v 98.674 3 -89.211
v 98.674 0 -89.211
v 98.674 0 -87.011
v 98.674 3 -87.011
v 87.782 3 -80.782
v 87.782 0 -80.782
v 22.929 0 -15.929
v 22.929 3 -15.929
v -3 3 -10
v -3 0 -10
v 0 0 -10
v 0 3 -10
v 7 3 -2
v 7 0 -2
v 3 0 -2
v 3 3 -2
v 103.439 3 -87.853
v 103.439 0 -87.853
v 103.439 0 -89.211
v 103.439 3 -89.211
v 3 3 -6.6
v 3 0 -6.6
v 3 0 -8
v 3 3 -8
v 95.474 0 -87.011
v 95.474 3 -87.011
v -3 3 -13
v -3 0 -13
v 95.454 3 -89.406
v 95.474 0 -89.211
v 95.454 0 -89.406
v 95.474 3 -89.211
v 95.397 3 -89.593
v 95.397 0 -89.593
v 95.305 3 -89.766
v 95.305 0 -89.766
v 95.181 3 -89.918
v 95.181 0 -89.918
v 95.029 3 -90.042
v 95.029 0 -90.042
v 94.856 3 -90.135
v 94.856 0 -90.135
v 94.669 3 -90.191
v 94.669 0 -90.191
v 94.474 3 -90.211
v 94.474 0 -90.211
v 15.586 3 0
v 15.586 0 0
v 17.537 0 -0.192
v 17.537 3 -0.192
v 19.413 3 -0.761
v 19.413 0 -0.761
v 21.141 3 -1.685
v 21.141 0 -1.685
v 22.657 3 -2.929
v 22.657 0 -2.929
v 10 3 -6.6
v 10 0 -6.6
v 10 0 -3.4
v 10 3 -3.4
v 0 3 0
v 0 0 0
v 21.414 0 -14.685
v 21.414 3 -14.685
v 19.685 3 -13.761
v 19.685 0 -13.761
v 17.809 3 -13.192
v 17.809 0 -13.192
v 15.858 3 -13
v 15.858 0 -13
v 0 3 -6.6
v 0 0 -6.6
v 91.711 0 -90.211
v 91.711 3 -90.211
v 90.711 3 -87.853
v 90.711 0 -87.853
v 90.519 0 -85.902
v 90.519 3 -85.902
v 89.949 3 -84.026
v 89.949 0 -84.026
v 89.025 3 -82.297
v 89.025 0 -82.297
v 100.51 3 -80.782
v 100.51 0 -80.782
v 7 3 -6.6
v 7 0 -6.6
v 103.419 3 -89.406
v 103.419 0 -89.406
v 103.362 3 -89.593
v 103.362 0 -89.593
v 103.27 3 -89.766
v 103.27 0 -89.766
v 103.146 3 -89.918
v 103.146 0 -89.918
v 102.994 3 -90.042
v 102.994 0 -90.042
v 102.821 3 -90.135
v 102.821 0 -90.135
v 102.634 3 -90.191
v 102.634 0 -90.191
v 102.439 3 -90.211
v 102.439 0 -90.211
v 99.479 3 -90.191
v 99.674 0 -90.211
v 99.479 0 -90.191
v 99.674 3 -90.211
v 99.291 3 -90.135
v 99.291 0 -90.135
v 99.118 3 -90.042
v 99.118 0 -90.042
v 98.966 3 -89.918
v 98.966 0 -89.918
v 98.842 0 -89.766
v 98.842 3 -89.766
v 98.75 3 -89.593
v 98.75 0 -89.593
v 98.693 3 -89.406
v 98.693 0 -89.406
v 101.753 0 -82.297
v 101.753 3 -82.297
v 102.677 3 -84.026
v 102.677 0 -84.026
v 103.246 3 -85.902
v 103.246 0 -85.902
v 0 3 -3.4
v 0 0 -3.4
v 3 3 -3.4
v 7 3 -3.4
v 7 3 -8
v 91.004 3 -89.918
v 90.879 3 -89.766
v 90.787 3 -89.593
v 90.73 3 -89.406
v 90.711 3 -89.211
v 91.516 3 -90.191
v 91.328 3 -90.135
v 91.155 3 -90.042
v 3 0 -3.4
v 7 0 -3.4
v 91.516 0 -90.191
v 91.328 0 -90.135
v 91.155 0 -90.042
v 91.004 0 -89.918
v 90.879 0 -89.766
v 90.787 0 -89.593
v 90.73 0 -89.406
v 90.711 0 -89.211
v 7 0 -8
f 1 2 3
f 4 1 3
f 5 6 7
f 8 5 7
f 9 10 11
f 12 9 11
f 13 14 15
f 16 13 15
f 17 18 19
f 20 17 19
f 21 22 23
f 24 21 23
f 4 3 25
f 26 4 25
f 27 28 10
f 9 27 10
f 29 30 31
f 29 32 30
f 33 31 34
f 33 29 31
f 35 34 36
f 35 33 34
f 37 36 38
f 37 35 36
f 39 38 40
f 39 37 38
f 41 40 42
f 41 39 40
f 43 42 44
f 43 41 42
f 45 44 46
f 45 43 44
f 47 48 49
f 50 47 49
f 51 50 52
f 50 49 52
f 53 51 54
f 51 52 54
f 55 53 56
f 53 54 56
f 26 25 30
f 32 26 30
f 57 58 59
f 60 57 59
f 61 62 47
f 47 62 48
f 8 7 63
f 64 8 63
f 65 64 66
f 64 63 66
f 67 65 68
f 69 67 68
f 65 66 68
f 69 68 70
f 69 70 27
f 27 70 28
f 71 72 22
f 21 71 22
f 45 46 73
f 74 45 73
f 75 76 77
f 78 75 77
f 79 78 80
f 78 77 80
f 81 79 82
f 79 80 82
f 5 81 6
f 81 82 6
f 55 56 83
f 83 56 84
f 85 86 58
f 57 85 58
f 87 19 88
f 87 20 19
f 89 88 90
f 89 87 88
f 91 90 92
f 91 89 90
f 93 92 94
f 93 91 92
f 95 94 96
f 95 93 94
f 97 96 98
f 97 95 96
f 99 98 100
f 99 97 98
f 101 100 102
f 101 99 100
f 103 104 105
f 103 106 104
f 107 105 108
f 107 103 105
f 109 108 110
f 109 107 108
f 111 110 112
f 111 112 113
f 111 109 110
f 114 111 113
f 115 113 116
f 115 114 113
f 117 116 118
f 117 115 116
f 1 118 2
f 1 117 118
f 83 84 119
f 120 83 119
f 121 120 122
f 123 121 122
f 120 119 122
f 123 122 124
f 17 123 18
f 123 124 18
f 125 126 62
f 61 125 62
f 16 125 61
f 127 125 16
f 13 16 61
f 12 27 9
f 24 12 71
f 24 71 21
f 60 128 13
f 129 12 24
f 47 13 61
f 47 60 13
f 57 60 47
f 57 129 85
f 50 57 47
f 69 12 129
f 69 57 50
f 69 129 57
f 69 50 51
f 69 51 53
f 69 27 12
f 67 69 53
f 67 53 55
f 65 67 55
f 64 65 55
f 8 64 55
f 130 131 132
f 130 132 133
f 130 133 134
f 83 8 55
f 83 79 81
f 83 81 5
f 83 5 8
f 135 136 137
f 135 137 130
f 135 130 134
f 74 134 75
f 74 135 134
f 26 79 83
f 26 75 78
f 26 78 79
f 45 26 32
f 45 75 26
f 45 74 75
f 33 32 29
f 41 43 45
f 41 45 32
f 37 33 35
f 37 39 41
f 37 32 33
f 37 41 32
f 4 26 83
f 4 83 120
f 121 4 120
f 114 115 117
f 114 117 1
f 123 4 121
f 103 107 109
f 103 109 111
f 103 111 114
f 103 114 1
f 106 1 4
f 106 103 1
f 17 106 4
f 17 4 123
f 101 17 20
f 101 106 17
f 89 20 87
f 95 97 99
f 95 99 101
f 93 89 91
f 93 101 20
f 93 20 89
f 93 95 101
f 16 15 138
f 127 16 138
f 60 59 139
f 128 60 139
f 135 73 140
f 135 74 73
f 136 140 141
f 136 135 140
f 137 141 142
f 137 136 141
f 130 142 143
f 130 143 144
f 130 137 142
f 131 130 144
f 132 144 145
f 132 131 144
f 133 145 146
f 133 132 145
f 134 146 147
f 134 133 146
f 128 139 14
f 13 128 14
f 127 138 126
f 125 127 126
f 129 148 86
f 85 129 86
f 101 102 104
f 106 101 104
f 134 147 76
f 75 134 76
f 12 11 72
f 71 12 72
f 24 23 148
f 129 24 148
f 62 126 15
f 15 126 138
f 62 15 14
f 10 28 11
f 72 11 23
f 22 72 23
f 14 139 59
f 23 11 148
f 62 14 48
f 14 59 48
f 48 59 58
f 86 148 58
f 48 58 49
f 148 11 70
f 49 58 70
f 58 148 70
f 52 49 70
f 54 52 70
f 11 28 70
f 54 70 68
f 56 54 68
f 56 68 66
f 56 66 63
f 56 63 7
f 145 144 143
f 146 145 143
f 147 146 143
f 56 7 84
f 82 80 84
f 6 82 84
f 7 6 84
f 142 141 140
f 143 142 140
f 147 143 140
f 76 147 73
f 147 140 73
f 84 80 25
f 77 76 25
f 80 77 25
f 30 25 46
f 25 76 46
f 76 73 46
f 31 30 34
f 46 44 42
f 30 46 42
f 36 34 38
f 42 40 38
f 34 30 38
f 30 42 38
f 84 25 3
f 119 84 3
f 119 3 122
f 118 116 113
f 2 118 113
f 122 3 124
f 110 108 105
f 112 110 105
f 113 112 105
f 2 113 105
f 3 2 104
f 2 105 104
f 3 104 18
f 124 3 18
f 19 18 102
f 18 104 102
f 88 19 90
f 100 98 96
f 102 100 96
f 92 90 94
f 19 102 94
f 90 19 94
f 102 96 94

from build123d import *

# Parameters (mm, degrees)
SALIENTE_EXTRUIR1_DEPTH = 3
REDONDEO1_R             = 1


with BuildPart() as part:
    # Croquis1 → Saliente-Extruir1 (new body)
    with BuildSketch(Plane(origin=(0, 0, 0), x_dir=(1, 0, 0), z_dir=(0, 1, 0))):
        with BuildLine():
            Line((10, 3.4), (7, 3.4))
            Line((7, 3.4), (7, 2))
            Line((7, 2), (3, 2))
            Line((3, 2), (3, 3.4))
            Line((3, 3.4), (0, 3.4))
            Line((0, 3.4), (0, 0))
            Line((0, 0), (15.585786438, 0))
            ThreePointArc((15.585786438, 0), (19.412620761, 0.761204675), (22.656854249, 2.928932188))
            Line((22.656854249, 2.928932188), (100.509667992, 80.781745931))
            ThreePointArc((100.509667992, 80.781745931), (102.677395505, 84.025979419), (103.43860018, 87.852813742))
            Line((103.43860018, 87.852813742), (103.43860018, 90.210678119))
            Line((103.43860018, 90.210678119), (98.67360018, 90.210678119))
            Line((98.67360018, 90.210678119), (98.67360018, 87.010678119))
            Line((98.67360018, 87.010678119), (95.47360018, 87.010678119))
            Line((95.47360018, 87.010678119), (95.47360018, 90.210678119))
            Line((95.47360018, 90.210678119), (90.710678119, 90.210678119))
            Line((90.710678119, 90.210678119), (90.710678119, 87.852813742))
            ThreePointArc((90.710678119, 87.852813742), (89.949473444, 84.025979419), (87.781745931, 80.781745931))
            Line((87.781745931, 80.781745931), (22.928932188, 15.928932188))
            ThreePointArc((22.928932188, 15.928932188), (19.6846987, 13.761204675), (15.857864376, 13))
            Line((15.857864376, 13), (-3, 13))
            Line((-3, 13), (-3, 10))
            Line((-3, 10), (0, 10))
            Line((0, 10), (0, 6.6))
            Line((0, 6.6), (3, 6.6))
            Line((3, 6.6), (3, 8))
            Line((3, 8), (7, 8))
            Line((7, 8), (7, 6.6))
            Line((7, 6.6), (10, 6.6))
            Line((10, 6.6), (10, 3.4))
        make_face()
    extrude(amount=SALIENTE_EXTRUIR1_DEPTH)

    # Redondeo1
    redondeo1_edges = [part.edges().sort_by_distance(p)[0] for p in [
        (90.710678119, 1.5, -90.210678119),
        (95.47360018, 1.5, -90.210678119),
        (98.67360018, 1.5, -90.210678119),
        (103.43860018, 1.5, -90.210678119),
    ]]
    fillet(redondeo1_edges, radius=REDONDEO1_R)


solid = part.part
